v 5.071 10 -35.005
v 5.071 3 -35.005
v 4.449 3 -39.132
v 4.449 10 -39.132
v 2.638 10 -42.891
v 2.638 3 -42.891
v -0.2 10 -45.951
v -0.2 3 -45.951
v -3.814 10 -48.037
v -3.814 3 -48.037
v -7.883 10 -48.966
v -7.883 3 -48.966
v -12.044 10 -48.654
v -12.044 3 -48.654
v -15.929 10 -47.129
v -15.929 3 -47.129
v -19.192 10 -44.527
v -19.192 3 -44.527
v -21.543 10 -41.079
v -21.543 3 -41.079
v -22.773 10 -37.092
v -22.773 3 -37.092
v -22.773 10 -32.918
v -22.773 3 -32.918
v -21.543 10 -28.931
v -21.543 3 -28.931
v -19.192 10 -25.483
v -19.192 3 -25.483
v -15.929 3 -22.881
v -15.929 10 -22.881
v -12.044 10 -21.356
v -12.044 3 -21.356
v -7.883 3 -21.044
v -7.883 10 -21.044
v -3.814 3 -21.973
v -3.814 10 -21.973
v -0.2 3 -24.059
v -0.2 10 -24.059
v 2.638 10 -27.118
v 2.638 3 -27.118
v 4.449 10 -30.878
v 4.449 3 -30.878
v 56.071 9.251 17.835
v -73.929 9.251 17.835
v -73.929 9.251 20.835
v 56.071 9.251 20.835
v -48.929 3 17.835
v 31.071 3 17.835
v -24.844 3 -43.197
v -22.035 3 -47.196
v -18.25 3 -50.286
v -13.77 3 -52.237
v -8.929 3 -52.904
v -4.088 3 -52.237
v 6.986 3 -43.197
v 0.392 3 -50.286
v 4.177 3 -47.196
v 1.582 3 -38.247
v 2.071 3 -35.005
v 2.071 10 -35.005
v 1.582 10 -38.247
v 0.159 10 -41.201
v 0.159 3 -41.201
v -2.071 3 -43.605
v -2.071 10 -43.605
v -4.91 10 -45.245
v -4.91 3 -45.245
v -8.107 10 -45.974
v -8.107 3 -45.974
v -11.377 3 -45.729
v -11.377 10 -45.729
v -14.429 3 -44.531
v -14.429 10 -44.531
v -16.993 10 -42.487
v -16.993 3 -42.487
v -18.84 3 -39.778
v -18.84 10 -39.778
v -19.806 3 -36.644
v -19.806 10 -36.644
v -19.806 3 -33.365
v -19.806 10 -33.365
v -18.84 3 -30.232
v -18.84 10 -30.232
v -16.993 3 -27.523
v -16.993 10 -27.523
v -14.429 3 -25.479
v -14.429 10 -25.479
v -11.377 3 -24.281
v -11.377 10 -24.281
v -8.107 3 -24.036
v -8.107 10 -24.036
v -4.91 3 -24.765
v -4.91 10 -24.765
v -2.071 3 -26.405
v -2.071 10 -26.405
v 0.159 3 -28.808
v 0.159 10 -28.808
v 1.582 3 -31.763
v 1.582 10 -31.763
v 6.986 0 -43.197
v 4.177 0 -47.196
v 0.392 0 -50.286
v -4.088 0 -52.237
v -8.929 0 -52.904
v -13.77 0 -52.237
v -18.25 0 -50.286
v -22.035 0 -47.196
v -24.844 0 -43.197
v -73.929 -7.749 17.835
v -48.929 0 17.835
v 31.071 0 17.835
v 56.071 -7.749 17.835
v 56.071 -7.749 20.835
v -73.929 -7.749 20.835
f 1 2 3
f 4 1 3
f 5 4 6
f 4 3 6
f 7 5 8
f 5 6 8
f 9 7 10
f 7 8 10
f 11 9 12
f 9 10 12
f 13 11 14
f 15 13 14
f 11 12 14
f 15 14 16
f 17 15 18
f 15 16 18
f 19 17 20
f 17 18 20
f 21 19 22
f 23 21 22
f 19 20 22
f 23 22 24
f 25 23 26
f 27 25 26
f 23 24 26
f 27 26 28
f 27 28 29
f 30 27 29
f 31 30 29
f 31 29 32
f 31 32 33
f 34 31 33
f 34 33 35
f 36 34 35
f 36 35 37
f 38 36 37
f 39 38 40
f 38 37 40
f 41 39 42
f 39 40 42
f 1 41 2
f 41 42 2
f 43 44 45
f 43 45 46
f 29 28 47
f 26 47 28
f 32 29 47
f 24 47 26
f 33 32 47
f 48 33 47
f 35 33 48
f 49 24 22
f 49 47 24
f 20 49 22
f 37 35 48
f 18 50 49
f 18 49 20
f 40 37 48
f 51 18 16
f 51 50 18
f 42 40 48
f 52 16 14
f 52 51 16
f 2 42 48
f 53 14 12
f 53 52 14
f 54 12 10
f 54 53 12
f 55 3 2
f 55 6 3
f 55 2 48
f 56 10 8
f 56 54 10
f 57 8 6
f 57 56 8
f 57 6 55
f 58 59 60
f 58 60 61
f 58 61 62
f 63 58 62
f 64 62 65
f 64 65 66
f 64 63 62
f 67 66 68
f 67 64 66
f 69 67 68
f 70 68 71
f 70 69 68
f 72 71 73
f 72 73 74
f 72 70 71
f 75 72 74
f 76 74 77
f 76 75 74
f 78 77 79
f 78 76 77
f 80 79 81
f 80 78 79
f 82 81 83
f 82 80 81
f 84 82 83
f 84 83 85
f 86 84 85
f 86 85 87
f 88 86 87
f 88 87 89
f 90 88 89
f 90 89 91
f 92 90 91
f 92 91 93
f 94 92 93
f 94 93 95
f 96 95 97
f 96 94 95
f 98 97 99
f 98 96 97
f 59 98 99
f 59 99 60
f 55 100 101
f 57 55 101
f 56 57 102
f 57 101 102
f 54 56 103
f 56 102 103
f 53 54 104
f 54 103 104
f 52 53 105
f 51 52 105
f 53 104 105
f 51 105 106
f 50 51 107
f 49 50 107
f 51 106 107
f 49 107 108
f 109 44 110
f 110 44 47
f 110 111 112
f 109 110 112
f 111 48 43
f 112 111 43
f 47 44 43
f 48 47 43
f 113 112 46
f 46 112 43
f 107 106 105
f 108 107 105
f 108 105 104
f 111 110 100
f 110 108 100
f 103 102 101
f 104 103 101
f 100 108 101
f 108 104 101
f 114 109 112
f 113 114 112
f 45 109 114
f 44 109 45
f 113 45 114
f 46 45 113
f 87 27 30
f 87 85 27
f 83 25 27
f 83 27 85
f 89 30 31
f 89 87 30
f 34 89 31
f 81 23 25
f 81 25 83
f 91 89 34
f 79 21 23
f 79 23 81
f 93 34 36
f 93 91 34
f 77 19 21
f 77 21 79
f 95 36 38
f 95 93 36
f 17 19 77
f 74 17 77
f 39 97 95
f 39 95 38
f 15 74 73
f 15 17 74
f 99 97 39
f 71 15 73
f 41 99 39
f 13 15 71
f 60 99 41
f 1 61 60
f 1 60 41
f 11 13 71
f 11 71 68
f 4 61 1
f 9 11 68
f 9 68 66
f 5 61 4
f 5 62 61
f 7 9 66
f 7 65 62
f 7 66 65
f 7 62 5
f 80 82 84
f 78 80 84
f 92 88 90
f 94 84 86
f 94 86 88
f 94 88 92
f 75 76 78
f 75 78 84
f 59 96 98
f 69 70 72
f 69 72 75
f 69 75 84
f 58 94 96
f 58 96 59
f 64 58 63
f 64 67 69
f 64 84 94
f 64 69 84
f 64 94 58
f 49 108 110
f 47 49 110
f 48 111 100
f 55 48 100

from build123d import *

# Parameters (mm, degrees)
BOSS_EXTRUDE1_DEPTH = 3
SKETCH2_R           = 14
SKETCH2_R_2         = 11
BOSS_EXTRUDE2_DEPTH = 7
SKETCH3_W           = 130
SKETCH3_H           = 17
BOSS_EXTRUDE3_DEPTH = 3


with BuildPart() as part:
    # Sketch1 → Boss-Extrude1 (new body)
    with BuildSketch(Plane(origin=(0, 0, 0), x_dir=(1, 0, 0), z_dir=(0, 1, 0))):
        with BuildLine():
            Line((-48.929144451, -17.835062273), (31.070855549, -17.835062273))
            Line((31.070855549, -17.835062273), (6.985518971, 43.196988966))
            ThreePointArc((6.985518971, 43.196988966), (-8.929144451, 52.904273338), (-24.843807874, 43.196988966))
            Line((-24.843807874, 43.196988966), (-48.929144451, -17.835062273))
        make_face()
    extrude(amount=BOSS_EXTRUDE1_DEPTH)

    # Sketch2 → Boss-Extrude2 (add)
    with BuildSketch(Plane(origin=(0, 3, 0), x_dir=(1, 0, 0), z_dir=(0, 1, 0))):
        with Locations((-8.929144451, 35.004937727)):
            Circle(SKETCH2_R)
        with Locations((-8.929144451, 35.004937727)):
            Circle(SKETCH2_R_2, mode=Mode.SUBTRACT)
    extrude(amount=BOSS_EXTRUDE2_DEPTH)

    # Sketch3 → Boss-Extrude3 (add)
    with BuildSketch(Plane.XY.offset(17.835062273)):
        with Locations((-8.929144451, 0.75050315)):
            Rectangle(SKETCH3_W, SKETCH3_H)
    extrude(amount=BOSS_EXTRUDE3_DEPTH)


solid = part.part
